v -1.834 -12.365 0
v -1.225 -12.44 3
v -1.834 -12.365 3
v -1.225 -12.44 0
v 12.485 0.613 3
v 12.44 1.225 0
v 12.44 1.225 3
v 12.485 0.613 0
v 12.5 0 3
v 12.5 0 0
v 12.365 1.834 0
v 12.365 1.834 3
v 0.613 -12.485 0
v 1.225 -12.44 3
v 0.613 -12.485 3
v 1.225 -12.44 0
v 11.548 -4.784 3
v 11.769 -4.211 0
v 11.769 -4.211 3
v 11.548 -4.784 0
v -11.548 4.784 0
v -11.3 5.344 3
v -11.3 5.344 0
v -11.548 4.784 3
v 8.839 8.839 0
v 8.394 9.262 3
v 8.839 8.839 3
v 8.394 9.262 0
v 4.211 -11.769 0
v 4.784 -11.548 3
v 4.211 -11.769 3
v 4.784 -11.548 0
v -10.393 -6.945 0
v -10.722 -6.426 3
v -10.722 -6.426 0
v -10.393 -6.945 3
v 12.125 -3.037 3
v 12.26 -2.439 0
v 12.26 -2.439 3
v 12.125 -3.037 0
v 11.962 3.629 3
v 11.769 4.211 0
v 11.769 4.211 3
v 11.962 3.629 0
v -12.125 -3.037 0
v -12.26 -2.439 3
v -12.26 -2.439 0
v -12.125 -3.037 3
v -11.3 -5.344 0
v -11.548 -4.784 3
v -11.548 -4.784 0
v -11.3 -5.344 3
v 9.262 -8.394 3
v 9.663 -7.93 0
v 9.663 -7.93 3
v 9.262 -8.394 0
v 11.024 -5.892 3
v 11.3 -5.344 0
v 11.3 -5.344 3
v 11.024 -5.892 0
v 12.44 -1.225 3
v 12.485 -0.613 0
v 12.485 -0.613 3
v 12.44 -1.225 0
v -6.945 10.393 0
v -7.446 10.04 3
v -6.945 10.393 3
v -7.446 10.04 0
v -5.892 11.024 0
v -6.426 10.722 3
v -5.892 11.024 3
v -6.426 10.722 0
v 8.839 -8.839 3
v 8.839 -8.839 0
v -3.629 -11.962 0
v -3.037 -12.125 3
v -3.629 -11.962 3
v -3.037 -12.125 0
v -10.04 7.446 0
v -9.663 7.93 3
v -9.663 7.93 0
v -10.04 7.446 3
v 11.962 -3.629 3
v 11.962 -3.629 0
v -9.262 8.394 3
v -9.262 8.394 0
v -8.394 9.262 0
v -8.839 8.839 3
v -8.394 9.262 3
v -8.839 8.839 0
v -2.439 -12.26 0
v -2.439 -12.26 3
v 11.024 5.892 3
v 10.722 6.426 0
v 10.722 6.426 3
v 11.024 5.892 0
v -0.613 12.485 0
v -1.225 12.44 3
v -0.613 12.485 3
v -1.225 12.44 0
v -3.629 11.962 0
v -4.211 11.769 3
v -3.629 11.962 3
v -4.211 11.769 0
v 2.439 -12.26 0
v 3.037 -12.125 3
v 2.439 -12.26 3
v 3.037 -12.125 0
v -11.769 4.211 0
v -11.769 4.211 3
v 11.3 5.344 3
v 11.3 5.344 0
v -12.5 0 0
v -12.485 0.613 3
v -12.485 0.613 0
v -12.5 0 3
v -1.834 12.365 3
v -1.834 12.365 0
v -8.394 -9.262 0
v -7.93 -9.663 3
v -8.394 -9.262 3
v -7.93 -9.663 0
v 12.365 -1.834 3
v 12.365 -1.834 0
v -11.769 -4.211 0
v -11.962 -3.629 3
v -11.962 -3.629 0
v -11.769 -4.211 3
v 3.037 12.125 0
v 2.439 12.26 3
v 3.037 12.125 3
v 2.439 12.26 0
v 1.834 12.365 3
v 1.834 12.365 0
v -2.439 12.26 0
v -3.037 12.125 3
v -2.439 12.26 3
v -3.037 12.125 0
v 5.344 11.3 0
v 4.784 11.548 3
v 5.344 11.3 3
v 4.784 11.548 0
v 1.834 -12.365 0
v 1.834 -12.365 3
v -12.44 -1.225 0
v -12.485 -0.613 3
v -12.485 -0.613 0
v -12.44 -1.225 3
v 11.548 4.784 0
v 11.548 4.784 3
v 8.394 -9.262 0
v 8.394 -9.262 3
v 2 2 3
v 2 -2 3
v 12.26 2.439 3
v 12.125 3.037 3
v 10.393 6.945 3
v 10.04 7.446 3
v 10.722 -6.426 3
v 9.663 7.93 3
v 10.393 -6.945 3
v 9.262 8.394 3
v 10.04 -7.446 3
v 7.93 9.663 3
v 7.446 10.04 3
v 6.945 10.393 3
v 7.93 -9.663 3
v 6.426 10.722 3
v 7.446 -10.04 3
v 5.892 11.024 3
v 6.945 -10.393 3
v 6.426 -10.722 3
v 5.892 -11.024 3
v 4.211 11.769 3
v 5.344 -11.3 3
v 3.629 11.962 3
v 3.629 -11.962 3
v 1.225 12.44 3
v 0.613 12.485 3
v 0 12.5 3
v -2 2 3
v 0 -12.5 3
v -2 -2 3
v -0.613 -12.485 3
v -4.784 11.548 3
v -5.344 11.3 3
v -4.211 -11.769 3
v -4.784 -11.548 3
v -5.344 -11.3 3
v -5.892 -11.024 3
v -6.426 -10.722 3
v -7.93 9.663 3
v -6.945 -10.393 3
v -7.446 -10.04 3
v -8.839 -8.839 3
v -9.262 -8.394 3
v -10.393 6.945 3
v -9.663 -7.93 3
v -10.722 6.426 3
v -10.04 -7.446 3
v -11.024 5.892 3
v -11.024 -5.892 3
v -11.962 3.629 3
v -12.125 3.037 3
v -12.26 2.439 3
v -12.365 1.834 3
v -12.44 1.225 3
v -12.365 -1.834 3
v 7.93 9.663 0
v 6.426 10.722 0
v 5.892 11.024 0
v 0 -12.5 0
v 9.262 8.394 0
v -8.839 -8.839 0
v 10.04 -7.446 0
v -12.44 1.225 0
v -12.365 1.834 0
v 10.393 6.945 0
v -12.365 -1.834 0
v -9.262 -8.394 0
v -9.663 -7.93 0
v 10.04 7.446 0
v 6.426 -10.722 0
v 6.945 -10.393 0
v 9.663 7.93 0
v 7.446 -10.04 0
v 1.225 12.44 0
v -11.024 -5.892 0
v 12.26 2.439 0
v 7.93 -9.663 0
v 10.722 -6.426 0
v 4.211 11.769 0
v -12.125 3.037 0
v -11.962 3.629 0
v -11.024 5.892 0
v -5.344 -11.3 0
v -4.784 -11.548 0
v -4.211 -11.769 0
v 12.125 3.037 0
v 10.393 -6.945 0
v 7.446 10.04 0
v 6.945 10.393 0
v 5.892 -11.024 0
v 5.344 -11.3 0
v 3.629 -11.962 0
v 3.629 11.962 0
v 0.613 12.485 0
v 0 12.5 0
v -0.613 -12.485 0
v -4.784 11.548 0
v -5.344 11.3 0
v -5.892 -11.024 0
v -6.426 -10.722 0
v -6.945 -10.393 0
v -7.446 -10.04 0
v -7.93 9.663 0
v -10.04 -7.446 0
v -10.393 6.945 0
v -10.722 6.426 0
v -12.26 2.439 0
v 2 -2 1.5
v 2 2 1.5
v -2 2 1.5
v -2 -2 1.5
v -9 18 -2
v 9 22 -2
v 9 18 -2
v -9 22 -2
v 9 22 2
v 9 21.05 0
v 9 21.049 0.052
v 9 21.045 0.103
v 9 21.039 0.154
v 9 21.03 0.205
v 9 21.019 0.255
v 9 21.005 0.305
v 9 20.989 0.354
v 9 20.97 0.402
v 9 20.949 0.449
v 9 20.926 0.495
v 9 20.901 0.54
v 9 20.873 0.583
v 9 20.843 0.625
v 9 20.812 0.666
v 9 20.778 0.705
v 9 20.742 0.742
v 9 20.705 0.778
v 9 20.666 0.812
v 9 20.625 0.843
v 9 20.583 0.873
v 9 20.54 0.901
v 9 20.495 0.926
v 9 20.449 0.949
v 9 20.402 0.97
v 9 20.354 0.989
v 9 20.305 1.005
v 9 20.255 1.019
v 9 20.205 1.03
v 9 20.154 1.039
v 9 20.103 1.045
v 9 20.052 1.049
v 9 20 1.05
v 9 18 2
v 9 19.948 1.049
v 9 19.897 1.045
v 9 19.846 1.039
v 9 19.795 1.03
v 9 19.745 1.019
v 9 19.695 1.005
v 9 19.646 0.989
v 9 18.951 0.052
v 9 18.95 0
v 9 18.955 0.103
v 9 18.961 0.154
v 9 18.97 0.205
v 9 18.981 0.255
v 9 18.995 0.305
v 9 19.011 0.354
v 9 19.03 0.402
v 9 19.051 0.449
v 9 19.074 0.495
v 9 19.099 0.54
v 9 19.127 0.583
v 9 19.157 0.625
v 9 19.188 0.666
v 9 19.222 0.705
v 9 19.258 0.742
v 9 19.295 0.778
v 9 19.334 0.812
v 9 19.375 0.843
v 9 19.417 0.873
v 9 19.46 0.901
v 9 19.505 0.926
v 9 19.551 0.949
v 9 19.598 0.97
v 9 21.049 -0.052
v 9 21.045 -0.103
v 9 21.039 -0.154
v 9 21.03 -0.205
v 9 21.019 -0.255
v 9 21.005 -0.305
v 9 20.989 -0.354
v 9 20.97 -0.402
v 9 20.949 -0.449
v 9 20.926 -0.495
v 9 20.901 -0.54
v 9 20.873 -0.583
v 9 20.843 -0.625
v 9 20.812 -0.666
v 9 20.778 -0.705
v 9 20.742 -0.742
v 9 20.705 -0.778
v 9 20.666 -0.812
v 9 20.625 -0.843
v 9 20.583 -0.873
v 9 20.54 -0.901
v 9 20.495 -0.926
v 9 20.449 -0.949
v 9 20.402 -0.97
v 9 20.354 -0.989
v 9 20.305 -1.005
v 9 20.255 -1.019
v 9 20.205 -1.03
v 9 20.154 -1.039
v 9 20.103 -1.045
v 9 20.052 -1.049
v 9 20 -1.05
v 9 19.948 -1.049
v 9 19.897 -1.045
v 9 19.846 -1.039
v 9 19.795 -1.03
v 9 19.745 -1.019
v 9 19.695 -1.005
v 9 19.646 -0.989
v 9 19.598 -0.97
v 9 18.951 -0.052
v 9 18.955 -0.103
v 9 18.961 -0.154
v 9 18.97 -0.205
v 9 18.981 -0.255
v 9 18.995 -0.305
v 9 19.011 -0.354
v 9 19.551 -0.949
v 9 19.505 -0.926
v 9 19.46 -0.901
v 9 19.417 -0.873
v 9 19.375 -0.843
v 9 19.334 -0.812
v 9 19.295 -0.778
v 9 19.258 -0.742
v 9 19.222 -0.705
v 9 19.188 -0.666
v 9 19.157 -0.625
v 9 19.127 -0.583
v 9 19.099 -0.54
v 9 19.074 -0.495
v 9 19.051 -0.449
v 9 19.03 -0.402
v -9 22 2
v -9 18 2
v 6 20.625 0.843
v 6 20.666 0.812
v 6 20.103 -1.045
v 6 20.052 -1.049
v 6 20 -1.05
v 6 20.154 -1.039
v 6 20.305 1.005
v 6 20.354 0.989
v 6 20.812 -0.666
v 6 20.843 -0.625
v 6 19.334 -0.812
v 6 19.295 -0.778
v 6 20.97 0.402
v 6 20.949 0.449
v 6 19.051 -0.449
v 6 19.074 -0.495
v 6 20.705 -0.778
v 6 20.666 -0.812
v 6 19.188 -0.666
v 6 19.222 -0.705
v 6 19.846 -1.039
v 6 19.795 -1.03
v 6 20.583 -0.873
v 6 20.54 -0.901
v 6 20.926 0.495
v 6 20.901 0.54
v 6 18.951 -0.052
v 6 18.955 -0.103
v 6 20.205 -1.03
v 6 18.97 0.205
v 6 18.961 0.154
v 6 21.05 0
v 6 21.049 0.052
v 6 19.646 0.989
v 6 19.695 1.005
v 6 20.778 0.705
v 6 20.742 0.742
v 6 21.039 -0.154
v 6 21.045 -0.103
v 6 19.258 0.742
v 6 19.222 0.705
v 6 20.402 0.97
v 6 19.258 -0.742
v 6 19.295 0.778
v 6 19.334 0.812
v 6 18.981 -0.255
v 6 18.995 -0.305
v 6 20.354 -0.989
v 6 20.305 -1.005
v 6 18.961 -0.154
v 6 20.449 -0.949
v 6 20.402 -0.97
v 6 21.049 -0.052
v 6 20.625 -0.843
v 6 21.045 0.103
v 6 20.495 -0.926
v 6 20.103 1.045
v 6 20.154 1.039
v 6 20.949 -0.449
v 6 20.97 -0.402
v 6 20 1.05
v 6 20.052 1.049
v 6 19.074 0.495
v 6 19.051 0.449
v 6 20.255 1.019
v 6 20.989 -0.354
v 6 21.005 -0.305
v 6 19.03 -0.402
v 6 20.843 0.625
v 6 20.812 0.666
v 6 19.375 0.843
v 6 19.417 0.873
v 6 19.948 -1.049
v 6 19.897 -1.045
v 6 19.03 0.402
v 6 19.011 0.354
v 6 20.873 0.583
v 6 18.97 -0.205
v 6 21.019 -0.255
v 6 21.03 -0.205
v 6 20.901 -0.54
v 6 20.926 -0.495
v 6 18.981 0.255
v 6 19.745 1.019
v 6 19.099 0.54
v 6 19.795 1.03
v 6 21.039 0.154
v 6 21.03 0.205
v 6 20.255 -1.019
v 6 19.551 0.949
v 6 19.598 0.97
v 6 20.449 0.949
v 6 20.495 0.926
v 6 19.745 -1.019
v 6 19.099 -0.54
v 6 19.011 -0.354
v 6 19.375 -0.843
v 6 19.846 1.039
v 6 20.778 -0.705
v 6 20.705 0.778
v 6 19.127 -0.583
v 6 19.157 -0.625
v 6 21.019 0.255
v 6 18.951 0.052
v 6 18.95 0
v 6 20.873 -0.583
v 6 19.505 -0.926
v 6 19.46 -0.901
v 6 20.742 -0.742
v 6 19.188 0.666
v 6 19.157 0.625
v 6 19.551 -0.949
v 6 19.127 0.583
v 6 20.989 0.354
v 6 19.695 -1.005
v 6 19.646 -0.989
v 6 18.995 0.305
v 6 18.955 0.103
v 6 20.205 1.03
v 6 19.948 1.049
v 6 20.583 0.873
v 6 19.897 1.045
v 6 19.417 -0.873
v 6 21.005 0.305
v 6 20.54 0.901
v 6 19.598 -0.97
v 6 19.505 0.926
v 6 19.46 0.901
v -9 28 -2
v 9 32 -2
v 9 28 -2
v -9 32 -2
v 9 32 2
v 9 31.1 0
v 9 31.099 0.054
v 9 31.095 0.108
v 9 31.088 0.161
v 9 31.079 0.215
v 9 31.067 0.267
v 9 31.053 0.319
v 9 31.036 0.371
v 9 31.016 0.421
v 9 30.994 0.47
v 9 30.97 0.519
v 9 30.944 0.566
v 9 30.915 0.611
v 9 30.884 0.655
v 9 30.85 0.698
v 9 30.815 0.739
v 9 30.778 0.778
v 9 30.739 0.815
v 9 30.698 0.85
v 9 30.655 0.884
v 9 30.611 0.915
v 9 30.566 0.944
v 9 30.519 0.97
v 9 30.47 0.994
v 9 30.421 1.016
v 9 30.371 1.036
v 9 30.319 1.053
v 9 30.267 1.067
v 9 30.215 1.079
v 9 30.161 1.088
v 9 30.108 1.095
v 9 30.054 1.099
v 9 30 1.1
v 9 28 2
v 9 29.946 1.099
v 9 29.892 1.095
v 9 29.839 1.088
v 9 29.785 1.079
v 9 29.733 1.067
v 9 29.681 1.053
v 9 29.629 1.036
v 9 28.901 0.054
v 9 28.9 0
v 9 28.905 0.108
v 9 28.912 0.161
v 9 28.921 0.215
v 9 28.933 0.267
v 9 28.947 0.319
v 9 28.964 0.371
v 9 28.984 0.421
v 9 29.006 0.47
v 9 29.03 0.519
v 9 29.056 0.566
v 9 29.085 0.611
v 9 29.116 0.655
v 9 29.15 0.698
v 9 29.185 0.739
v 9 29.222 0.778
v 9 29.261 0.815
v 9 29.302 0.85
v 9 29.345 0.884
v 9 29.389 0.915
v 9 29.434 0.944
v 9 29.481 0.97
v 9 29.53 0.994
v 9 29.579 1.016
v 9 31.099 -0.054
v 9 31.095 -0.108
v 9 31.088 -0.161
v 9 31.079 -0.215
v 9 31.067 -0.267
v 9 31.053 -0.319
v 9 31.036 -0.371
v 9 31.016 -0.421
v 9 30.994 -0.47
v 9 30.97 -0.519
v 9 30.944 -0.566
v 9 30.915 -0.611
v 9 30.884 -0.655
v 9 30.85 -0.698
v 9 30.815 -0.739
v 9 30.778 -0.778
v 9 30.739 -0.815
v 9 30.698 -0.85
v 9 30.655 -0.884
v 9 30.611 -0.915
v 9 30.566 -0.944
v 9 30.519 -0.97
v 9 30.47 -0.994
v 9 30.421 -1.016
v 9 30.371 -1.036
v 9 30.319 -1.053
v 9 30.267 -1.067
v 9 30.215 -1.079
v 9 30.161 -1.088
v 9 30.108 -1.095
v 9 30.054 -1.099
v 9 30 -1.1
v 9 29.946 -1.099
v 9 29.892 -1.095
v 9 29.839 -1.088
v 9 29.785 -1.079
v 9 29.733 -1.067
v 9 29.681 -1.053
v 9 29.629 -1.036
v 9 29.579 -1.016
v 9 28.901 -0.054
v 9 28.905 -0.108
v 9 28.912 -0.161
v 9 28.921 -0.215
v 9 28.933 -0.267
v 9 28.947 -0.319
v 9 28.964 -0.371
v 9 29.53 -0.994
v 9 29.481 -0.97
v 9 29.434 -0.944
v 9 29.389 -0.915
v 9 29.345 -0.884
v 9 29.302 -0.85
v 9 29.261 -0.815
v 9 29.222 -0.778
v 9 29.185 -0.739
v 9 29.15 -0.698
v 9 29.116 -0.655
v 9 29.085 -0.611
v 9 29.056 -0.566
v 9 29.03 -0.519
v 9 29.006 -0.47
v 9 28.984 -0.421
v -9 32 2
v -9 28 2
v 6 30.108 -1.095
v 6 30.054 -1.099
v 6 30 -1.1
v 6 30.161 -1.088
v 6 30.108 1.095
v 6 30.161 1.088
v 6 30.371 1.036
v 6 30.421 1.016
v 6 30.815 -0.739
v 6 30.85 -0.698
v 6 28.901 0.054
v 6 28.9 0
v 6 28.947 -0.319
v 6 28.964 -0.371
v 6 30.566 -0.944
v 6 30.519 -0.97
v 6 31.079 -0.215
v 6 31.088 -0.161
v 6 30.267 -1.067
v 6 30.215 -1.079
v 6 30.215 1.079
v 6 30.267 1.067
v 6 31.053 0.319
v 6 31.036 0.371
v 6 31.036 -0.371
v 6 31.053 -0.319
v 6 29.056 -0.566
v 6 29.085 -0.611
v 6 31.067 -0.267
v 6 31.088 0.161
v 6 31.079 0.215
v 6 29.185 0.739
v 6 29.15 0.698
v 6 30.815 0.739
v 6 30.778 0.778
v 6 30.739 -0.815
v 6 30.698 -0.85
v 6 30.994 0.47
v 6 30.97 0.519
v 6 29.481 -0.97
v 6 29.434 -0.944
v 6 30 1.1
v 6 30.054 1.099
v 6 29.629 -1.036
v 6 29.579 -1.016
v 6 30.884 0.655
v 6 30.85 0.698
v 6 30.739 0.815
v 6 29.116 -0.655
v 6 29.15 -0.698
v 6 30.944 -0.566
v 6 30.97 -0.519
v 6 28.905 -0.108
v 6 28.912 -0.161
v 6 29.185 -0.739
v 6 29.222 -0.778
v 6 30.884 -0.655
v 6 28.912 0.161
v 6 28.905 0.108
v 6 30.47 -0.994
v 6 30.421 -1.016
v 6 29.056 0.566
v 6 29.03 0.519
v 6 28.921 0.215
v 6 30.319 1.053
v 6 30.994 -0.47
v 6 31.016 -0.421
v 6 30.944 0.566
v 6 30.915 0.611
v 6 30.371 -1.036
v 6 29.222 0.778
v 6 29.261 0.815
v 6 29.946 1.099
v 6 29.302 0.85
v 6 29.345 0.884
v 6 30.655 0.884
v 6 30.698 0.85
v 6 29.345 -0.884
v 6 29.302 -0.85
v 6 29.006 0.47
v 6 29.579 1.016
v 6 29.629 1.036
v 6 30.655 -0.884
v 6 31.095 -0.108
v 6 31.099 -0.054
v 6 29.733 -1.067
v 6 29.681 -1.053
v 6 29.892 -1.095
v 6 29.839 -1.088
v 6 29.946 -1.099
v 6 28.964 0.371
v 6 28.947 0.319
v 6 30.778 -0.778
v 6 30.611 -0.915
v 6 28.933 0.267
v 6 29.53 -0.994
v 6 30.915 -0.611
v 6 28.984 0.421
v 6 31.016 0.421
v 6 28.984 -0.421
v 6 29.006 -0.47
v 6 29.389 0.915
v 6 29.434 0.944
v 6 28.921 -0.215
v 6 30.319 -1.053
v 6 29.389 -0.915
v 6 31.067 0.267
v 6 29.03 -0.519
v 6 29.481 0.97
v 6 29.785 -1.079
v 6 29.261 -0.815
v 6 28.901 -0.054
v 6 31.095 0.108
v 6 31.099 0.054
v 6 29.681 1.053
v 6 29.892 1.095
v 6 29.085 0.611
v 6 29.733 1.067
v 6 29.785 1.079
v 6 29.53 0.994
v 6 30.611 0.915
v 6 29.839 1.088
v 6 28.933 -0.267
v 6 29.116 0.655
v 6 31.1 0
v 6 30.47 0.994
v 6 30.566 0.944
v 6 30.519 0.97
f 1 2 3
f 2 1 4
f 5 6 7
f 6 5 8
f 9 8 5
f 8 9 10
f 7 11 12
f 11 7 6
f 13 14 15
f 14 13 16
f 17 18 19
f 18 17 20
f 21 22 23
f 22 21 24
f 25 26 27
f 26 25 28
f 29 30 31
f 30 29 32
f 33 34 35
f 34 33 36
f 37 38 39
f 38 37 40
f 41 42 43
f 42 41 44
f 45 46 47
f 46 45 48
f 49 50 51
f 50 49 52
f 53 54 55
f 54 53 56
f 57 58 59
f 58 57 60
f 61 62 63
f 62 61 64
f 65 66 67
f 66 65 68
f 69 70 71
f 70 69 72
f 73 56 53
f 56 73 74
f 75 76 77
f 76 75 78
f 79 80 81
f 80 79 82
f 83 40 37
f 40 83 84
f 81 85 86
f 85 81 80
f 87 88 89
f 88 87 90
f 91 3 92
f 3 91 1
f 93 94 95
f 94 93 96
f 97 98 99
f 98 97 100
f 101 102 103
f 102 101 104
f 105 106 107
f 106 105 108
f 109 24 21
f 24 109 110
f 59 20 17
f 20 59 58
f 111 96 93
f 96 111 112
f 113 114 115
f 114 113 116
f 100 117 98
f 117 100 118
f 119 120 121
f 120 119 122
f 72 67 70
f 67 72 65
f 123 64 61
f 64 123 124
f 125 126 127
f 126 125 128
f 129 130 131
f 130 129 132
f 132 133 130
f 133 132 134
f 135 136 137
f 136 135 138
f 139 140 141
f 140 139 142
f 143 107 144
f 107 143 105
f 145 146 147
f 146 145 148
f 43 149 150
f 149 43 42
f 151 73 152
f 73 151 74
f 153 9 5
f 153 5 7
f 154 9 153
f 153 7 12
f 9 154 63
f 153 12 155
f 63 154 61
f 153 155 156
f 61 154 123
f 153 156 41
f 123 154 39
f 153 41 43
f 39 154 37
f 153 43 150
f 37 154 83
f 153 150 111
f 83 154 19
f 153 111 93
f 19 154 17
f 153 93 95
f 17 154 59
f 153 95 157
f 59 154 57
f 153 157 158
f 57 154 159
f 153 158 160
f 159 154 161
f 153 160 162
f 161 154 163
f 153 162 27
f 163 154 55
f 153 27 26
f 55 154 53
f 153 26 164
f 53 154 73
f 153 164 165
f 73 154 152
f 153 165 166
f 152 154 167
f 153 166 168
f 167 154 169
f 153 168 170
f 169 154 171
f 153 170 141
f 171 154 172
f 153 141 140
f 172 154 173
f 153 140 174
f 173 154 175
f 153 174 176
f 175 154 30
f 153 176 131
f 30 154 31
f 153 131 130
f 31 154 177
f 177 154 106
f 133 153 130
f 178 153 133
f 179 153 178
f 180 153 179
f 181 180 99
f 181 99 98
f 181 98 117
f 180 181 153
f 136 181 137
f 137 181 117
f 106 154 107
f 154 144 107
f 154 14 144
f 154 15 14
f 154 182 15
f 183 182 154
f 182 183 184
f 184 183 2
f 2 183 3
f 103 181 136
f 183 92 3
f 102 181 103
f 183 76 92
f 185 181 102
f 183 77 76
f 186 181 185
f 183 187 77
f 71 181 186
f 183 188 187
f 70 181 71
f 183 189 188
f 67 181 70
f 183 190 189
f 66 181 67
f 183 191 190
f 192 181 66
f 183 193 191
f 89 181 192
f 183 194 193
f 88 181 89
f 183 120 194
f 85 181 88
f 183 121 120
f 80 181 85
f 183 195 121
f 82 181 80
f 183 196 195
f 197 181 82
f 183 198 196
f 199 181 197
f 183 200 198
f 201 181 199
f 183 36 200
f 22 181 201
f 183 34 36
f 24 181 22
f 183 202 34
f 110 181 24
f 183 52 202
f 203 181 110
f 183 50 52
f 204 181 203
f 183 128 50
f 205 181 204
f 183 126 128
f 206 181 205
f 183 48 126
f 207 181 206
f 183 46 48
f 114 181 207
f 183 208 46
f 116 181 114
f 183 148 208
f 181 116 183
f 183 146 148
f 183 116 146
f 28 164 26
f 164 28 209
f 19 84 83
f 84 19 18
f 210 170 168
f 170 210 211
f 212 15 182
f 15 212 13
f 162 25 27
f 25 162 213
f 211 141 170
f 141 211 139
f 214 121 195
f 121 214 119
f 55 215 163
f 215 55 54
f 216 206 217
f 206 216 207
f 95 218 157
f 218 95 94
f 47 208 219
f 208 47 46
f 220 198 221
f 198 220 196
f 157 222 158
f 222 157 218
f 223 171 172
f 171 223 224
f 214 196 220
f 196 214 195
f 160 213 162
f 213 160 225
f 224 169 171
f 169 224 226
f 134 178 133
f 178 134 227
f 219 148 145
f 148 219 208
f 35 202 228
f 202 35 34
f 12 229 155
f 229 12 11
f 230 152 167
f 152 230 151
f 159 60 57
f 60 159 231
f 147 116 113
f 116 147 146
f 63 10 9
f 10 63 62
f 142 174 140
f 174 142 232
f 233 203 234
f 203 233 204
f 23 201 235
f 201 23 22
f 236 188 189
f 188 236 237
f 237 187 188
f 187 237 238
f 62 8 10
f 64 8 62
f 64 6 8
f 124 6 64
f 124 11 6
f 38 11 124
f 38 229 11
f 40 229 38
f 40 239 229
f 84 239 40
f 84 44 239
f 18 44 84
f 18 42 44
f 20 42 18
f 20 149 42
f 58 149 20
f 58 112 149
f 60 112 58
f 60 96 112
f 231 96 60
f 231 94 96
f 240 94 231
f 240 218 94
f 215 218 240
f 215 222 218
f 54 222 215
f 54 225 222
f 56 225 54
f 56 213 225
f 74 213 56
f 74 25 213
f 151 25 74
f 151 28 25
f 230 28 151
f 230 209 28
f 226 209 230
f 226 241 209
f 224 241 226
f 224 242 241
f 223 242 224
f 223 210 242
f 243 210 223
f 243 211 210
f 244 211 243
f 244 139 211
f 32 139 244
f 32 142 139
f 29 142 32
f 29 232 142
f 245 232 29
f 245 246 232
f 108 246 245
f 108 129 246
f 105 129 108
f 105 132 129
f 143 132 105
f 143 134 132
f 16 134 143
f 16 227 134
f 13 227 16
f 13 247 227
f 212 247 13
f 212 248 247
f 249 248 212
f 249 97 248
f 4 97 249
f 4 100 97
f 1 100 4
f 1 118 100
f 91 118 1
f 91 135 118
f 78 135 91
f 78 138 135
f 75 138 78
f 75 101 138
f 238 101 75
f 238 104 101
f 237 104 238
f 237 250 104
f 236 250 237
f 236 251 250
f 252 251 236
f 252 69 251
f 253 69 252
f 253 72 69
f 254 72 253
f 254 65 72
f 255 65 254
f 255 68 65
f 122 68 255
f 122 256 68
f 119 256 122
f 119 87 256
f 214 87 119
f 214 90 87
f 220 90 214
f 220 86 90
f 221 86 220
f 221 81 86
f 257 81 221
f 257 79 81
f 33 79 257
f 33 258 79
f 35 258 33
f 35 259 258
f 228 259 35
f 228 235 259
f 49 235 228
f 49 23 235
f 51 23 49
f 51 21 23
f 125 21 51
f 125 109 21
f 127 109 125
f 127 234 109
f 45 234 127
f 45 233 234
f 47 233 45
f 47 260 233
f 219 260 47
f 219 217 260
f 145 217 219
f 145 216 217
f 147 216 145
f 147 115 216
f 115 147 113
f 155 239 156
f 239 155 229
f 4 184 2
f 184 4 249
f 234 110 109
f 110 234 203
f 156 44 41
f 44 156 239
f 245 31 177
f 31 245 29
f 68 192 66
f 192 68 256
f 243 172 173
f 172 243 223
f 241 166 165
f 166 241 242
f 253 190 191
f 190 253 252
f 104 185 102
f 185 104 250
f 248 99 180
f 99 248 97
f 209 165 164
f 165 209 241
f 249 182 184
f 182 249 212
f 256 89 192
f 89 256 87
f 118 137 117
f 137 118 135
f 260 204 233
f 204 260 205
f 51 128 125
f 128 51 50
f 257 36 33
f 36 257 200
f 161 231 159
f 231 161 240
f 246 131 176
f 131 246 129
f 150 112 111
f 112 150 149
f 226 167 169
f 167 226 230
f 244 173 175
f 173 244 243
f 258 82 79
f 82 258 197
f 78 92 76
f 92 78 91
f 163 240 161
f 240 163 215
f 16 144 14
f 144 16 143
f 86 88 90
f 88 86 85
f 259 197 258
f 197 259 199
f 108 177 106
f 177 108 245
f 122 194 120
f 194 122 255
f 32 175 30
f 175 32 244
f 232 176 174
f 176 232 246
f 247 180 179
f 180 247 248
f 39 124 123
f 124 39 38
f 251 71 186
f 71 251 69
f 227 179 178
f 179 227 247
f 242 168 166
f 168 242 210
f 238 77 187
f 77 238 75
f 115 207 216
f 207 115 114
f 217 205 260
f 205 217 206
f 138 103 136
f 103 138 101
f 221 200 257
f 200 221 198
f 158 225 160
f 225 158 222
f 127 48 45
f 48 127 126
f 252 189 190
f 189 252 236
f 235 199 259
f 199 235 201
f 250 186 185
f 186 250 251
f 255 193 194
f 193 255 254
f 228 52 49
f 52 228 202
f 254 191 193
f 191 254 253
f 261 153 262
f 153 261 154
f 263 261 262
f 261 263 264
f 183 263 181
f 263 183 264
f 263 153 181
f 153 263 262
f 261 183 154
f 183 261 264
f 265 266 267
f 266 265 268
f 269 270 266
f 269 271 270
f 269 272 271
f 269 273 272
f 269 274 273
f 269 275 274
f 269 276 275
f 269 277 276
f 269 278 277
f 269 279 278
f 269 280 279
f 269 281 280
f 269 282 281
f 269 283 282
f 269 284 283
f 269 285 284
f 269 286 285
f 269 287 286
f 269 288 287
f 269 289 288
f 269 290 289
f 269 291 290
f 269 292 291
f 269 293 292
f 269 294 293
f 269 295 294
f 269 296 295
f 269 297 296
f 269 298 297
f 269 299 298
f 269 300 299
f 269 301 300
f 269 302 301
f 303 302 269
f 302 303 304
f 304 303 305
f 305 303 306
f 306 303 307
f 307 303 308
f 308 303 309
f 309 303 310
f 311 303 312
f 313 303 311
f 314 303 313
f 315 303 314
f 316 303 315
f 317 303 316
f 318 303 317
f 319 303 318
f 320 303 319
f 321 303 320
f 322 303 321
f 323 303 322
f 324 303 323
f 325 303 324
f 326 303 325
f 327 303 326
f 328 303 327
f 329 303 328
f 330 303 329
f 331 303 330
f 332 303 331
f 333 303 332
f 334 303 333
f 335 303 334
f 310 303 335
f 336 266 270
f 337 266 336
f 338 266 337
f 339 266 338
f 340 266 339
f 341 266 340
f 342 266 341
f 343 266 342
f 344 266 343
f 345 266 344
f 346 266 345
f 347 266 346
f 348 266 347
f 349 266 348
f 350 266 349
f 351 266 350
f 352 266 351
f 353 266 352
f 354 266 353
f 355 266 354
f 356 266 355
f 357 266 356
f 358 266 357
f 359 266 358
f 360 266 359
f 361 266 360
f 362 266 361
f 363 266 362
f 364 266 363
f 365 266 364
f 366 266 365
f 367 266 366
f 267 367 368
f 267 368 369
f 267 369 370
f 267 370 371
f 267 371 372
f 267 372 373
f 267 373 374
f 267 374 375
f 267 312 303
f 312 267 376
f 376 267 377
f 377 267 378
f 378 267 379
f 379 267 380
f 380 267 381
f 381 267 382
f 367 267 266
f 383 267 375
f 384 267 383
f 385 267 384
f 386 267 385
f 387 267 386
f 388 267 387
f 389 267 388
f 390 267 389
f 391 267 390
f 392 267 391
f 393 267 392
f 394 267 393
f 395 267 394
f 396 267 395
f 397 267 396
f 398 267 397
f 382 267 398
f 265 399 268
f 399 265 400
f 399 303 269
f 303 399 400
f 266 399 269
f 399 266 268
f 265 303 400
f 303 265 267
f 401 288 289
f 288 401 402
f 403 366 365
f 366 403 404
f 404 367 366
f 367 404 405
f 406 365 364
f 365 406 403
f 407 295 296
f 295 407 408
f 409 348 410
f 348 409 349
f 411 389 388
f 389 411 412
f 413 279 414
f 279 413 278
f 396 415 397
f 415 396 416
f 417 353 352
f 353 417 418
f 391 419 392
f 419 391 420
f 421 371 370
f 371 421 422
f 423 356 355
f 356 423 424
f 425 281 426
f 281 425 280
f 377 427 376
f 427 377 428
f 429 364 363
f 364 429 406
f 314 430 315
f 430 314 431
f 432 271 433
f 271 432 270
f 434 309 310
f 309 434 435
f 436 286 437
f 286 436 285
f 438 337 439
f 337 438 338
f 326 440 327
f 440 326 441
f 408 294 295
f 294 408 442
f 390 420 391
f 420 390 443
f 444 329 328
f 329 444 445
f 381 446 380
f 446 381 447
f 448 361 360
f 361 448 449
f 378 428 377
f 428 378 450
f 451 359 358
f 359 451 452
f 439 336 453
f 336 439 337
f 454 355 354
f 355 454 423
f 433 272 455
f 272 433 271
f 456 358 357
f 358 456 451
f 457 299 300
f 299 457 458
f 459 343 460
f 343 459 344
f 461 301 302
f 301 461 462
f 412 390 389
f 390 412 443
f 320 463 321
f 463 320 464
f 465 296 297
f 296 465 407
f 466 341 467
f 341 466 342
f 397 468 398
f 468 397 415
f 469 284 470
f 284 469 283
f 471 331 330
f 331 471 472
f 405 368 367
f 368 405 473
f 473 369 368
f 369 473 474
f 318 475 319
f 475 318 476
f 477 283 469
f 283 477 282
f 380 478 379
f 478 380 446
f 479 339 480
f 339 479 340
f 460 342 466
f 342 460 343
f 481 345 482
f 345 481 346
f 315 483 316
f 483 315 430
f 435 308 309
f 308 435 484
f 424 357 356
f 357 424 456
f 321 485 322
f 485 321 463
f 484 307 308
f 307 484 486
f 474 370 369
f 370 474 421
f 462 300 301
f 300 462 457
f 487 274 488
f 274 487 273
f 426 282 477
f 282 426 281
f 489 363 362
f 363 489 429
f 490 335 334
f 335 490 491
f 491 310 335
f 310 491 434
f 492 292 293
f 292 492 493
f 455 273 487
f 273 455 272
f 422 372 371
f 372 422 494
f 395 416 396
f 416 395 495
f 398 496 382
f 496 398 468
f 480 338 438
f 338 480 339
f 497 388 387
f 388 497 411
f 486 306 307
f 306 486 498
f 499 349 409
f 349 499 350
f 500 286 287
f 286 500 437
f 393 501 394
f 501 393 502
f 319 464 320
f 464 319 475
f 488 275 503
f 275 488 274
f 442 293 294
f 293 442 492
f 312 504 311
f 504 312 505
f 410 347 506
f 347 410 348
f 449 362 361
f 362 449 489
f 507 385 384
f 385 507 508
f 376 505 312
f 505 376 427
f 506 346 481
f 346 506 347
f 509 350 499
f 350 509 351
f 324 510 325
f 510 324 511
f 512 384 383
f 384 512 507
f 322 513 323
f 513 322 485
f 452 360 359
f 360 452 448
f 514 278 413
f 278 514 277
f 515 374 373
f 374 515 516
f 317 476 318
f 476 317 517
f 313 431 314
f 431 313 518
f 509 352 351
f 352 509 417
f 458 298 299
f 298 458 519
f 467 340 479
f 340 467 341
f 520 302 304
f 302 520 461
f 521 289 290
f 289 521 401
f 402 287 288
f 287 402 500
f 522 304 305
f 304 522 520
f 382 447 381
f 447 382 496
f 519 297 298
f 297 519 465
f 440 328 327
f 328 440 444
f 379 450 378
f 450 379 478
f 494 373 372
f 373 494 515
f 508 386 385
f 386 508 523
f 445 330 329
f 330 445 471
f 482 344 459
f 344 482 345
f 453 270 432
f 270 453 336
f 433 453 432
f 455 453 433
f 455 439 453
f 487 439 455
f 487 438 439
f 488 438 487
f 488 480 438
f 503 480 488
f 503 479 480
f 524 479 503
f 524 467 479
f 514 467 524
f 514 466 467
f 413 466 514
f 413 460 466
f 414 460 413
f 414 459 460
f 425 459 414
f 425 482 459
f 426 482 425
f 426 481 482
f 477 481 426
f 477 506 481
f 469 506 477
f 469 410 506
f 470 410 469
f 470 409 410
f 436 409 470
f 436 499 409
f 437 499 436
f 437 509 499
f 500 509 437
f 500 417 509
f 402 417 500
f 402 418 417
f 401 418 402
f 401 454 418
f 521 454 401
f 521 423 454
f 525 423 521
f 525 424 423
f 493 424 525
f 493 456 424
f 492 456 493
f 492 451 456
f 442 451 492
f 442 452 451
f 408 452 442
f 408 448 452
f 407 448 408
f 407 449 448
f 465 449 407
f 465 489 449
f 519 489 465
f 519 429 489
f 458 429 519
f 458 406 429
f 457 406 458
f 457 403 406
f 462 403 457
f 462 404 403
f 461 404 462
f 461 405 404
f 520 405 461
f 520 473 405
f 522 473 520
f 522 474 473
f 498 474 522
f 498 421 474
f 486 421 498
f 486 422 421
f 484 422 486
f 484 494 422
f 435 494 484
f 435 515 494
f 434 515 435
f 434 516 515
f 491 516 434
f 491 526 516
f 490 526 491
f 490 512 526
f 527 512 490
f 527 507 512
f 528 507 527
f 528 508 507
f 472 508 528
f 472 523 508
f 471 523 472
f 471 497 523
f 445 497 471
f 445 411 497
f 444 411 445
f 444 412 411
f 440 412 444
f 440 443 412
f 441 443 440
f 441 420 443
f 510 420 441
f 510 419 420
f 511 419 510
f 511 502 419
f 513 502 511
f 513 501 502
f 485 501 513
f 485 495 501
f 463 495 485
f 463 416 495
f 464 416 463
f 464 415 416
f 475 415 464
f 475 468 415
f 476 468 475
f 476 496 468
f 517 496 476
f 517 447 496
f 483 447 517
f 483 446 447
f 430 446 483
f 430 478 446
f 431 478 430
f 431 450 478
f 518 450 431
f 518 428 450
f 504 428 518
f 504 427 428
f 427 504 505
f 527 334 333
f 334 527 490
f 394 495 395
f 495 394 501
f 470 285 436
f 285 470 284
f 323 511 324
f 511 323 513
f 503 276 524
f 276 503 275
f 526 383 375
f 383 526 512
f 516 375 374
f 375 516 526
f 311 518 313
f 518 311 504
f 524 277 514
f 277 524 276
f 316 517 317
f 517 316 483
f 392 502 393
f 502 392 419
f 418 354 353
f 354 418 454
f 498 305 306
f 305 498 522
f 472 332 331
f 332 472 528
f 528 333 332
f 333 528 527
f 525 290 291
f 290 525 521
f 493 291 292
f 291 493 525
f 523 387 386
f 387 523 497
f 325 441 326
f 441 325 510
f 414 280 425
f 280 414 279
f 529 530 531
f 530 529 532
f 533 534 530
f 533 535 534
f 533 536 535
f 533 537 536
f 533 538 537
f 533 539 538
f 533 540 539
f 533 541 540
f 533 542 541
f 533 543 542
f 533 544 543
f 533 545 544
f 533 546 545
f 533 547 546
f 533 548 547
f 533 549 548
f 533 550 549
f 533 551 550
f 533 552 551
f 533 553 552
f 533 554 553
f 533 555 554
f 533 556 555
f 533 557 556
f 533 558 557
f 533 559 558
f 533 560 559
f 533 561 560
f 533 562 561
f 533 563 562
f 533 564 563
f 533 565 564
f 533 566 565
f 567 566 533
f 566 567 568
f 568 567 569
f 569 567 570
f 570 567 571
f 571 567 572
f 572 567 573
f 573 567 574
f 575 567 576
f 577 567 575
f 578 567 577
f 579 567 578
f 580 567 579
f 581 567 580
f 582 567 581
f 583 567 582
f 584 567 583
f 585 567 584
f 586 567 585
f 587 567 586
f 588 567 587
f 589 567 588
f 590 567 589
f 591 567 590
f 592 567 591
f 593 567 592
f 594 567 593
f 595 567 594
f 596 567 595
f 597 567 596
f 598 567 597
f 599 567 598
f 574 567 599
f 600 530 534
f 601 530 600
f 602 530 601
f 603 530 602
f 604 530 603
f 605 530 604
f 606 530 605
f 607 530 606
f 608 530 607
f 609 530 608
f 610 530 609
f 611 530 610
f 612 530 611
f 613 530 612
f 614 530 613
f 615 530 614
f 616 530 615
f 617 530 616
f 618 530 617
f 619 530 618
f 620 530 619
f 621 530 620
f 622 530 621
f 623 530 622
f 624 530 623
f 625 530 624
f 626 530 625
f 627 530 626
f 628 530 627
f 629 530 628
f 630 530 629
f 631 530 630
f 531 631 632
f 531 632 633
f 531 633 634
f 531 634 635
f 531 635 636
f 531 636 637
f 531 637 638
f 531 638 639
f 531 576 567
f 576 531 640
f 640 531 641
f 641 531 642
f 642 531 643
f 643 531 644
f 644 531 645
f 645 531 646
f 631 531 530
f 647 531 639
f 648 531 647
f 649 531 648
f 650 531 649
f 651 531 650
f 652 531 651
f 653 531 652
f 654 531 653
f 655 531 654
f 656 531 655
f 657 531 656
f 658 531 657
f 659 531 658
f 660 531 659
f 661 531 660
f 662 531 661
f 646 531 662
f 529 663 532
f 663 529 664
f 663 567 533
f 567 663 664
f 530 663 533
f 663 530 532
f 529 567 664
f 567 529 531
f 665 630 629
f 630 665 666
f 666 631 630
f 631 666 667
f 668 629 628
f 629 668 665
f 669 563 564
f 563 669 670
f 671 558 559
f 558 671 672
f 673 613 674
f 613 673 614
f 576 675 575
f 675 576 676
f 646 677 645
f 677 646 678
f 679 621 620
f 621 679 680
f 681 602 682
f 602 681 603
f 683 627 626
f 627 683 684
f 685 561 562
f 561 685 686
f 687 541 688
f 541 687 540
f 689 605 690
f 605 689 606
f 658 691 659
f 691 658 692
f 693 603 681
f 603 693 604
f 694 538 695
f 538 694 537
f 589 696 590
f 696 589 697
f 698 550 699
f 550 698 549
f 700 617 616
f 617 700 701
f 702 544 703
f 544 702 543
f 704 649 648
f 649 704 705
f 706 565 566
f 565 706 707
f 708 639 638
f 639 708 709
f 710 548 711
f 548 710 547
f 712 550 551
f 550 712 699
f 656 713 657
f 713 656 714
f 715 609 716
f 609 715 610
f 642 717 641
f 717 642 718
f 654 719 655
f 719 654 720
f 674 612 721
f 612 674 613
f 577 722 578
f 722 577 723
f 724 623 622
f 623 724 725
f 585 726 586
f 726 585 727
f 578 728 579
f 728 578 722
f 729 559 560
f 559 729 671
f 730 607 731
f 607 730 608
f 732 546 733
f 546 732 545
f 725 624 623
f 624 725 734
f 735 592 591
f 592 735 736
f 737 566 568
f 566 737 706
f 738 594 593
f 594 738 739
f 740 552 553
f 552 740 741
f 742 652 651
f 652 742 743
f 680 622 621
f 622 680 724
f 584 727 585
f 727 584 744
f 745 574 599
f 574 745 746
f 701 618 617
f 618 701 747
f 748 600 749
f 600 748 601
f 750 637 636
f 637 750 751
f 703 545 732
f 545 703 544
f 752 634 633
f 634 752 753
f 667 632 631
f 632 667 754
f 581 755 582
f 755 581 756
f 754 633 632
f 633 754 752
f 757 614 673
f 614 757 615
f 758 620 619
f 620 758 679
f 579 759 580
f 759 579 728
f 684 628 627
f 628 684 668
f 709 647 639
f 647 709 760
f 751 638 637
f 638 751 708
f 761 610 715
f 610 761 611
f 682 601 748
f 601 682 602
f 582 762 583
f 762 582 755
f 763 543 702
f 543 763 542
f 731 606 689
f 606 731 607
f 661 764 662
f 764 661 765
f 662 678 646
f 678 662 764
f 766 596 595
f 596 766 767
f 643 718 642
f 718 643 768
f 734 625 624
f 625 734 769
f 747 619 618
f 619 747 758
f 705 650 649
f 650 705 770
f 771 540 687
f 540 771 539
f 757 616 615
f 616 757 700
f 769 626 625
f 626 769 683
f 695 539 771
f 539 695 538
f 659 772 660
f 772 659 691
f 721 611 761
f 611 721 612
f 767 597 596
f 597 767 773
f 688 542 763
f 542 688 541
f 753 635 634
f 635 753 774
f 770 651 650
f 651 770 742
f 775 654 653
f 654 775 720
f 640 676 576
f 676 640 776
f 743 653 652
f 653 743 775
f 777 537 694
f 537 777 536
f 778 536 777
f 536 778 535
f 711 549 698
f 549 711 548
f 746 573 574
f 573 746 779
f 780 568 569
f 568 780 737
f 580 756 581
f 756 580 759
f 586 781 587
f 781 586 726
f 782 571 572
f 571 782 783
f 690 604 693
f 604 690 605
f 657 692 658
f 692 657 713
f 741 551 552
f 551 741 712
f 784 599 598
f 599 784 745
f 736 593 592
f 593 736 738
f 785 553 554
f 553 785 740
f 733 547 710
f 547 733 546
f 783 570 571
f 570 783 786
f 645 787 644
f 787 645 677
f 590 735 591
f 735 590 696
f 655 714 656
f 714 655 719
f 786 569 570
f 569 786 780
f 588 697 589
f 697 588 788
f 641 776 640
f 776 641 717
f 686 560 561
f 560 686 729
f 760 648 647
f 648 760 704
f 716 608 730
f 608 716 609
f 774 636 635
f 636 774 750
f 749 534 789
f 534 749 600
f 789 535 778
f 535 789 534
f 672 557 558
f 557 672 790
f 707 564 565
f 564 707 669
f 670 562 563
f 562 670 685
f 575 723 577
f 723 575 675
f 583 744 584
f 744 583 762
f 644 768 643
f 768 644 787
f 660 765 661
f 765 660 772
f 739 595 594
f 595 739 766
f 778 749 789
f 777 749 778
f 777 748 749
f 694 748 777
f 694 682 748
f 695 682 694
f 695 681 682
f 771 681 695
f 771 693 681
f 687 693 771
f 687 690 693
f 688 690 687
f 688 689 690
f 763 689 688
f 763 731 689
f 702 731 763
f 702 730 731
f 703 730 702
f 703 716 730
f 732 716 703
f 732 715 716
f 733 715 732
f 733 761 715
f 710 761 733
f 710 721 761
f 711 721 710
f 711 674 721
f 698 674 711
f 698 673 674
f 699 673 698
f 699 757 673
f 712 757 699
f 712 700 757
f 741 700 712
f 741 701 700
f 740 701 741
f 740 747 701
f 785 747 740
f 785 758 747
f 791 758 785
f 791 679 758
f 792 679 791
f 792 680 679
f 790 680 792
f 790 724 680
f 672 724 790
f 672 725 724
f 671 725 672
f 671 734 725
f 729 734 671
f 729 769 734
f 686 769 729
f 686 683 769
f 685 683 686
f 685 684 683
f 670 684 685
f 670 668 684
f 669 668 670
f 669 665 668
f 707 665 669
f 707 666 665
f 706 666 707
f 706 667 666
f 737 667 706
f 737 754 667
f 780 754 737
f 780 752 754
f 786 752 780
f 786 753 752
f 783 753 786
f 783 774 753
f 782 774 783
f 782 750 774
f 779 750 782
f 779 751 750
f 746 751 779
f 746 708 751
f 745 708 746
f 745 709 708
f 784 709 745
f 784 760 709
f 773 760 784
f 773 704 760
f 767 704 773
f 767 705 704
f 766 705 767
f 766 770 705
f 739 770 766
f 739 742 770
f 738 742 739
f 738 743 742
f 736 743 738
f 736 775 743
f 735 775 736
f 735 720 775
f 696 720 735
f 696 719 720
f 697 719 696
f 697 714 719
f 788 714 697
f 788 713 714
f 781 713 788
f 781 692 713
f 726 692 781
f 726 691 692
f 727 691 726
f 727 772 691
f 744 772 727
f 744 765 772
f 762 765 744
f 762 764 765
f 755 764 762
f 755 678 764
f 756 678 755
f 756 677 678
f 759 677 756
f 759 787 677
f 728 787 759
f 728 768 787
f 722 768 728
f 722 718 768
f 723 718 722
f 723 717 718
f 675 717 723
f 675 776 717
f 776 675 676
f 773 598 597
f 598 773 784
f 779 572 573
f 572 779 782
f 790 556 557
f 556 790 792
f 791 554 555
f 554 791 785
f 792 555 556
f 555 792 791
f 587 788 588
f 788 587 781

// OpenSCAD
    difference() {
        cylinder(d=25, h=3, $fn=128);
        translate([0,0,10.5])
        cube([4,4,18], center=true);
    }
  
translate([0,20,0])
rotate([0,90,0])
difference() {
    cube([4,4,18], center=true);
    translate([0,0,6])
    cylinder(d=2.1, h=3.1, $fn=128);
}

translate([0,30,0])
rotate([0,90,0])
difference() {
    cube([4,4,18], center=true);
    translate([0,0,6])
    cylinder(d=2.2, h=3.1, $fn=128);
}
